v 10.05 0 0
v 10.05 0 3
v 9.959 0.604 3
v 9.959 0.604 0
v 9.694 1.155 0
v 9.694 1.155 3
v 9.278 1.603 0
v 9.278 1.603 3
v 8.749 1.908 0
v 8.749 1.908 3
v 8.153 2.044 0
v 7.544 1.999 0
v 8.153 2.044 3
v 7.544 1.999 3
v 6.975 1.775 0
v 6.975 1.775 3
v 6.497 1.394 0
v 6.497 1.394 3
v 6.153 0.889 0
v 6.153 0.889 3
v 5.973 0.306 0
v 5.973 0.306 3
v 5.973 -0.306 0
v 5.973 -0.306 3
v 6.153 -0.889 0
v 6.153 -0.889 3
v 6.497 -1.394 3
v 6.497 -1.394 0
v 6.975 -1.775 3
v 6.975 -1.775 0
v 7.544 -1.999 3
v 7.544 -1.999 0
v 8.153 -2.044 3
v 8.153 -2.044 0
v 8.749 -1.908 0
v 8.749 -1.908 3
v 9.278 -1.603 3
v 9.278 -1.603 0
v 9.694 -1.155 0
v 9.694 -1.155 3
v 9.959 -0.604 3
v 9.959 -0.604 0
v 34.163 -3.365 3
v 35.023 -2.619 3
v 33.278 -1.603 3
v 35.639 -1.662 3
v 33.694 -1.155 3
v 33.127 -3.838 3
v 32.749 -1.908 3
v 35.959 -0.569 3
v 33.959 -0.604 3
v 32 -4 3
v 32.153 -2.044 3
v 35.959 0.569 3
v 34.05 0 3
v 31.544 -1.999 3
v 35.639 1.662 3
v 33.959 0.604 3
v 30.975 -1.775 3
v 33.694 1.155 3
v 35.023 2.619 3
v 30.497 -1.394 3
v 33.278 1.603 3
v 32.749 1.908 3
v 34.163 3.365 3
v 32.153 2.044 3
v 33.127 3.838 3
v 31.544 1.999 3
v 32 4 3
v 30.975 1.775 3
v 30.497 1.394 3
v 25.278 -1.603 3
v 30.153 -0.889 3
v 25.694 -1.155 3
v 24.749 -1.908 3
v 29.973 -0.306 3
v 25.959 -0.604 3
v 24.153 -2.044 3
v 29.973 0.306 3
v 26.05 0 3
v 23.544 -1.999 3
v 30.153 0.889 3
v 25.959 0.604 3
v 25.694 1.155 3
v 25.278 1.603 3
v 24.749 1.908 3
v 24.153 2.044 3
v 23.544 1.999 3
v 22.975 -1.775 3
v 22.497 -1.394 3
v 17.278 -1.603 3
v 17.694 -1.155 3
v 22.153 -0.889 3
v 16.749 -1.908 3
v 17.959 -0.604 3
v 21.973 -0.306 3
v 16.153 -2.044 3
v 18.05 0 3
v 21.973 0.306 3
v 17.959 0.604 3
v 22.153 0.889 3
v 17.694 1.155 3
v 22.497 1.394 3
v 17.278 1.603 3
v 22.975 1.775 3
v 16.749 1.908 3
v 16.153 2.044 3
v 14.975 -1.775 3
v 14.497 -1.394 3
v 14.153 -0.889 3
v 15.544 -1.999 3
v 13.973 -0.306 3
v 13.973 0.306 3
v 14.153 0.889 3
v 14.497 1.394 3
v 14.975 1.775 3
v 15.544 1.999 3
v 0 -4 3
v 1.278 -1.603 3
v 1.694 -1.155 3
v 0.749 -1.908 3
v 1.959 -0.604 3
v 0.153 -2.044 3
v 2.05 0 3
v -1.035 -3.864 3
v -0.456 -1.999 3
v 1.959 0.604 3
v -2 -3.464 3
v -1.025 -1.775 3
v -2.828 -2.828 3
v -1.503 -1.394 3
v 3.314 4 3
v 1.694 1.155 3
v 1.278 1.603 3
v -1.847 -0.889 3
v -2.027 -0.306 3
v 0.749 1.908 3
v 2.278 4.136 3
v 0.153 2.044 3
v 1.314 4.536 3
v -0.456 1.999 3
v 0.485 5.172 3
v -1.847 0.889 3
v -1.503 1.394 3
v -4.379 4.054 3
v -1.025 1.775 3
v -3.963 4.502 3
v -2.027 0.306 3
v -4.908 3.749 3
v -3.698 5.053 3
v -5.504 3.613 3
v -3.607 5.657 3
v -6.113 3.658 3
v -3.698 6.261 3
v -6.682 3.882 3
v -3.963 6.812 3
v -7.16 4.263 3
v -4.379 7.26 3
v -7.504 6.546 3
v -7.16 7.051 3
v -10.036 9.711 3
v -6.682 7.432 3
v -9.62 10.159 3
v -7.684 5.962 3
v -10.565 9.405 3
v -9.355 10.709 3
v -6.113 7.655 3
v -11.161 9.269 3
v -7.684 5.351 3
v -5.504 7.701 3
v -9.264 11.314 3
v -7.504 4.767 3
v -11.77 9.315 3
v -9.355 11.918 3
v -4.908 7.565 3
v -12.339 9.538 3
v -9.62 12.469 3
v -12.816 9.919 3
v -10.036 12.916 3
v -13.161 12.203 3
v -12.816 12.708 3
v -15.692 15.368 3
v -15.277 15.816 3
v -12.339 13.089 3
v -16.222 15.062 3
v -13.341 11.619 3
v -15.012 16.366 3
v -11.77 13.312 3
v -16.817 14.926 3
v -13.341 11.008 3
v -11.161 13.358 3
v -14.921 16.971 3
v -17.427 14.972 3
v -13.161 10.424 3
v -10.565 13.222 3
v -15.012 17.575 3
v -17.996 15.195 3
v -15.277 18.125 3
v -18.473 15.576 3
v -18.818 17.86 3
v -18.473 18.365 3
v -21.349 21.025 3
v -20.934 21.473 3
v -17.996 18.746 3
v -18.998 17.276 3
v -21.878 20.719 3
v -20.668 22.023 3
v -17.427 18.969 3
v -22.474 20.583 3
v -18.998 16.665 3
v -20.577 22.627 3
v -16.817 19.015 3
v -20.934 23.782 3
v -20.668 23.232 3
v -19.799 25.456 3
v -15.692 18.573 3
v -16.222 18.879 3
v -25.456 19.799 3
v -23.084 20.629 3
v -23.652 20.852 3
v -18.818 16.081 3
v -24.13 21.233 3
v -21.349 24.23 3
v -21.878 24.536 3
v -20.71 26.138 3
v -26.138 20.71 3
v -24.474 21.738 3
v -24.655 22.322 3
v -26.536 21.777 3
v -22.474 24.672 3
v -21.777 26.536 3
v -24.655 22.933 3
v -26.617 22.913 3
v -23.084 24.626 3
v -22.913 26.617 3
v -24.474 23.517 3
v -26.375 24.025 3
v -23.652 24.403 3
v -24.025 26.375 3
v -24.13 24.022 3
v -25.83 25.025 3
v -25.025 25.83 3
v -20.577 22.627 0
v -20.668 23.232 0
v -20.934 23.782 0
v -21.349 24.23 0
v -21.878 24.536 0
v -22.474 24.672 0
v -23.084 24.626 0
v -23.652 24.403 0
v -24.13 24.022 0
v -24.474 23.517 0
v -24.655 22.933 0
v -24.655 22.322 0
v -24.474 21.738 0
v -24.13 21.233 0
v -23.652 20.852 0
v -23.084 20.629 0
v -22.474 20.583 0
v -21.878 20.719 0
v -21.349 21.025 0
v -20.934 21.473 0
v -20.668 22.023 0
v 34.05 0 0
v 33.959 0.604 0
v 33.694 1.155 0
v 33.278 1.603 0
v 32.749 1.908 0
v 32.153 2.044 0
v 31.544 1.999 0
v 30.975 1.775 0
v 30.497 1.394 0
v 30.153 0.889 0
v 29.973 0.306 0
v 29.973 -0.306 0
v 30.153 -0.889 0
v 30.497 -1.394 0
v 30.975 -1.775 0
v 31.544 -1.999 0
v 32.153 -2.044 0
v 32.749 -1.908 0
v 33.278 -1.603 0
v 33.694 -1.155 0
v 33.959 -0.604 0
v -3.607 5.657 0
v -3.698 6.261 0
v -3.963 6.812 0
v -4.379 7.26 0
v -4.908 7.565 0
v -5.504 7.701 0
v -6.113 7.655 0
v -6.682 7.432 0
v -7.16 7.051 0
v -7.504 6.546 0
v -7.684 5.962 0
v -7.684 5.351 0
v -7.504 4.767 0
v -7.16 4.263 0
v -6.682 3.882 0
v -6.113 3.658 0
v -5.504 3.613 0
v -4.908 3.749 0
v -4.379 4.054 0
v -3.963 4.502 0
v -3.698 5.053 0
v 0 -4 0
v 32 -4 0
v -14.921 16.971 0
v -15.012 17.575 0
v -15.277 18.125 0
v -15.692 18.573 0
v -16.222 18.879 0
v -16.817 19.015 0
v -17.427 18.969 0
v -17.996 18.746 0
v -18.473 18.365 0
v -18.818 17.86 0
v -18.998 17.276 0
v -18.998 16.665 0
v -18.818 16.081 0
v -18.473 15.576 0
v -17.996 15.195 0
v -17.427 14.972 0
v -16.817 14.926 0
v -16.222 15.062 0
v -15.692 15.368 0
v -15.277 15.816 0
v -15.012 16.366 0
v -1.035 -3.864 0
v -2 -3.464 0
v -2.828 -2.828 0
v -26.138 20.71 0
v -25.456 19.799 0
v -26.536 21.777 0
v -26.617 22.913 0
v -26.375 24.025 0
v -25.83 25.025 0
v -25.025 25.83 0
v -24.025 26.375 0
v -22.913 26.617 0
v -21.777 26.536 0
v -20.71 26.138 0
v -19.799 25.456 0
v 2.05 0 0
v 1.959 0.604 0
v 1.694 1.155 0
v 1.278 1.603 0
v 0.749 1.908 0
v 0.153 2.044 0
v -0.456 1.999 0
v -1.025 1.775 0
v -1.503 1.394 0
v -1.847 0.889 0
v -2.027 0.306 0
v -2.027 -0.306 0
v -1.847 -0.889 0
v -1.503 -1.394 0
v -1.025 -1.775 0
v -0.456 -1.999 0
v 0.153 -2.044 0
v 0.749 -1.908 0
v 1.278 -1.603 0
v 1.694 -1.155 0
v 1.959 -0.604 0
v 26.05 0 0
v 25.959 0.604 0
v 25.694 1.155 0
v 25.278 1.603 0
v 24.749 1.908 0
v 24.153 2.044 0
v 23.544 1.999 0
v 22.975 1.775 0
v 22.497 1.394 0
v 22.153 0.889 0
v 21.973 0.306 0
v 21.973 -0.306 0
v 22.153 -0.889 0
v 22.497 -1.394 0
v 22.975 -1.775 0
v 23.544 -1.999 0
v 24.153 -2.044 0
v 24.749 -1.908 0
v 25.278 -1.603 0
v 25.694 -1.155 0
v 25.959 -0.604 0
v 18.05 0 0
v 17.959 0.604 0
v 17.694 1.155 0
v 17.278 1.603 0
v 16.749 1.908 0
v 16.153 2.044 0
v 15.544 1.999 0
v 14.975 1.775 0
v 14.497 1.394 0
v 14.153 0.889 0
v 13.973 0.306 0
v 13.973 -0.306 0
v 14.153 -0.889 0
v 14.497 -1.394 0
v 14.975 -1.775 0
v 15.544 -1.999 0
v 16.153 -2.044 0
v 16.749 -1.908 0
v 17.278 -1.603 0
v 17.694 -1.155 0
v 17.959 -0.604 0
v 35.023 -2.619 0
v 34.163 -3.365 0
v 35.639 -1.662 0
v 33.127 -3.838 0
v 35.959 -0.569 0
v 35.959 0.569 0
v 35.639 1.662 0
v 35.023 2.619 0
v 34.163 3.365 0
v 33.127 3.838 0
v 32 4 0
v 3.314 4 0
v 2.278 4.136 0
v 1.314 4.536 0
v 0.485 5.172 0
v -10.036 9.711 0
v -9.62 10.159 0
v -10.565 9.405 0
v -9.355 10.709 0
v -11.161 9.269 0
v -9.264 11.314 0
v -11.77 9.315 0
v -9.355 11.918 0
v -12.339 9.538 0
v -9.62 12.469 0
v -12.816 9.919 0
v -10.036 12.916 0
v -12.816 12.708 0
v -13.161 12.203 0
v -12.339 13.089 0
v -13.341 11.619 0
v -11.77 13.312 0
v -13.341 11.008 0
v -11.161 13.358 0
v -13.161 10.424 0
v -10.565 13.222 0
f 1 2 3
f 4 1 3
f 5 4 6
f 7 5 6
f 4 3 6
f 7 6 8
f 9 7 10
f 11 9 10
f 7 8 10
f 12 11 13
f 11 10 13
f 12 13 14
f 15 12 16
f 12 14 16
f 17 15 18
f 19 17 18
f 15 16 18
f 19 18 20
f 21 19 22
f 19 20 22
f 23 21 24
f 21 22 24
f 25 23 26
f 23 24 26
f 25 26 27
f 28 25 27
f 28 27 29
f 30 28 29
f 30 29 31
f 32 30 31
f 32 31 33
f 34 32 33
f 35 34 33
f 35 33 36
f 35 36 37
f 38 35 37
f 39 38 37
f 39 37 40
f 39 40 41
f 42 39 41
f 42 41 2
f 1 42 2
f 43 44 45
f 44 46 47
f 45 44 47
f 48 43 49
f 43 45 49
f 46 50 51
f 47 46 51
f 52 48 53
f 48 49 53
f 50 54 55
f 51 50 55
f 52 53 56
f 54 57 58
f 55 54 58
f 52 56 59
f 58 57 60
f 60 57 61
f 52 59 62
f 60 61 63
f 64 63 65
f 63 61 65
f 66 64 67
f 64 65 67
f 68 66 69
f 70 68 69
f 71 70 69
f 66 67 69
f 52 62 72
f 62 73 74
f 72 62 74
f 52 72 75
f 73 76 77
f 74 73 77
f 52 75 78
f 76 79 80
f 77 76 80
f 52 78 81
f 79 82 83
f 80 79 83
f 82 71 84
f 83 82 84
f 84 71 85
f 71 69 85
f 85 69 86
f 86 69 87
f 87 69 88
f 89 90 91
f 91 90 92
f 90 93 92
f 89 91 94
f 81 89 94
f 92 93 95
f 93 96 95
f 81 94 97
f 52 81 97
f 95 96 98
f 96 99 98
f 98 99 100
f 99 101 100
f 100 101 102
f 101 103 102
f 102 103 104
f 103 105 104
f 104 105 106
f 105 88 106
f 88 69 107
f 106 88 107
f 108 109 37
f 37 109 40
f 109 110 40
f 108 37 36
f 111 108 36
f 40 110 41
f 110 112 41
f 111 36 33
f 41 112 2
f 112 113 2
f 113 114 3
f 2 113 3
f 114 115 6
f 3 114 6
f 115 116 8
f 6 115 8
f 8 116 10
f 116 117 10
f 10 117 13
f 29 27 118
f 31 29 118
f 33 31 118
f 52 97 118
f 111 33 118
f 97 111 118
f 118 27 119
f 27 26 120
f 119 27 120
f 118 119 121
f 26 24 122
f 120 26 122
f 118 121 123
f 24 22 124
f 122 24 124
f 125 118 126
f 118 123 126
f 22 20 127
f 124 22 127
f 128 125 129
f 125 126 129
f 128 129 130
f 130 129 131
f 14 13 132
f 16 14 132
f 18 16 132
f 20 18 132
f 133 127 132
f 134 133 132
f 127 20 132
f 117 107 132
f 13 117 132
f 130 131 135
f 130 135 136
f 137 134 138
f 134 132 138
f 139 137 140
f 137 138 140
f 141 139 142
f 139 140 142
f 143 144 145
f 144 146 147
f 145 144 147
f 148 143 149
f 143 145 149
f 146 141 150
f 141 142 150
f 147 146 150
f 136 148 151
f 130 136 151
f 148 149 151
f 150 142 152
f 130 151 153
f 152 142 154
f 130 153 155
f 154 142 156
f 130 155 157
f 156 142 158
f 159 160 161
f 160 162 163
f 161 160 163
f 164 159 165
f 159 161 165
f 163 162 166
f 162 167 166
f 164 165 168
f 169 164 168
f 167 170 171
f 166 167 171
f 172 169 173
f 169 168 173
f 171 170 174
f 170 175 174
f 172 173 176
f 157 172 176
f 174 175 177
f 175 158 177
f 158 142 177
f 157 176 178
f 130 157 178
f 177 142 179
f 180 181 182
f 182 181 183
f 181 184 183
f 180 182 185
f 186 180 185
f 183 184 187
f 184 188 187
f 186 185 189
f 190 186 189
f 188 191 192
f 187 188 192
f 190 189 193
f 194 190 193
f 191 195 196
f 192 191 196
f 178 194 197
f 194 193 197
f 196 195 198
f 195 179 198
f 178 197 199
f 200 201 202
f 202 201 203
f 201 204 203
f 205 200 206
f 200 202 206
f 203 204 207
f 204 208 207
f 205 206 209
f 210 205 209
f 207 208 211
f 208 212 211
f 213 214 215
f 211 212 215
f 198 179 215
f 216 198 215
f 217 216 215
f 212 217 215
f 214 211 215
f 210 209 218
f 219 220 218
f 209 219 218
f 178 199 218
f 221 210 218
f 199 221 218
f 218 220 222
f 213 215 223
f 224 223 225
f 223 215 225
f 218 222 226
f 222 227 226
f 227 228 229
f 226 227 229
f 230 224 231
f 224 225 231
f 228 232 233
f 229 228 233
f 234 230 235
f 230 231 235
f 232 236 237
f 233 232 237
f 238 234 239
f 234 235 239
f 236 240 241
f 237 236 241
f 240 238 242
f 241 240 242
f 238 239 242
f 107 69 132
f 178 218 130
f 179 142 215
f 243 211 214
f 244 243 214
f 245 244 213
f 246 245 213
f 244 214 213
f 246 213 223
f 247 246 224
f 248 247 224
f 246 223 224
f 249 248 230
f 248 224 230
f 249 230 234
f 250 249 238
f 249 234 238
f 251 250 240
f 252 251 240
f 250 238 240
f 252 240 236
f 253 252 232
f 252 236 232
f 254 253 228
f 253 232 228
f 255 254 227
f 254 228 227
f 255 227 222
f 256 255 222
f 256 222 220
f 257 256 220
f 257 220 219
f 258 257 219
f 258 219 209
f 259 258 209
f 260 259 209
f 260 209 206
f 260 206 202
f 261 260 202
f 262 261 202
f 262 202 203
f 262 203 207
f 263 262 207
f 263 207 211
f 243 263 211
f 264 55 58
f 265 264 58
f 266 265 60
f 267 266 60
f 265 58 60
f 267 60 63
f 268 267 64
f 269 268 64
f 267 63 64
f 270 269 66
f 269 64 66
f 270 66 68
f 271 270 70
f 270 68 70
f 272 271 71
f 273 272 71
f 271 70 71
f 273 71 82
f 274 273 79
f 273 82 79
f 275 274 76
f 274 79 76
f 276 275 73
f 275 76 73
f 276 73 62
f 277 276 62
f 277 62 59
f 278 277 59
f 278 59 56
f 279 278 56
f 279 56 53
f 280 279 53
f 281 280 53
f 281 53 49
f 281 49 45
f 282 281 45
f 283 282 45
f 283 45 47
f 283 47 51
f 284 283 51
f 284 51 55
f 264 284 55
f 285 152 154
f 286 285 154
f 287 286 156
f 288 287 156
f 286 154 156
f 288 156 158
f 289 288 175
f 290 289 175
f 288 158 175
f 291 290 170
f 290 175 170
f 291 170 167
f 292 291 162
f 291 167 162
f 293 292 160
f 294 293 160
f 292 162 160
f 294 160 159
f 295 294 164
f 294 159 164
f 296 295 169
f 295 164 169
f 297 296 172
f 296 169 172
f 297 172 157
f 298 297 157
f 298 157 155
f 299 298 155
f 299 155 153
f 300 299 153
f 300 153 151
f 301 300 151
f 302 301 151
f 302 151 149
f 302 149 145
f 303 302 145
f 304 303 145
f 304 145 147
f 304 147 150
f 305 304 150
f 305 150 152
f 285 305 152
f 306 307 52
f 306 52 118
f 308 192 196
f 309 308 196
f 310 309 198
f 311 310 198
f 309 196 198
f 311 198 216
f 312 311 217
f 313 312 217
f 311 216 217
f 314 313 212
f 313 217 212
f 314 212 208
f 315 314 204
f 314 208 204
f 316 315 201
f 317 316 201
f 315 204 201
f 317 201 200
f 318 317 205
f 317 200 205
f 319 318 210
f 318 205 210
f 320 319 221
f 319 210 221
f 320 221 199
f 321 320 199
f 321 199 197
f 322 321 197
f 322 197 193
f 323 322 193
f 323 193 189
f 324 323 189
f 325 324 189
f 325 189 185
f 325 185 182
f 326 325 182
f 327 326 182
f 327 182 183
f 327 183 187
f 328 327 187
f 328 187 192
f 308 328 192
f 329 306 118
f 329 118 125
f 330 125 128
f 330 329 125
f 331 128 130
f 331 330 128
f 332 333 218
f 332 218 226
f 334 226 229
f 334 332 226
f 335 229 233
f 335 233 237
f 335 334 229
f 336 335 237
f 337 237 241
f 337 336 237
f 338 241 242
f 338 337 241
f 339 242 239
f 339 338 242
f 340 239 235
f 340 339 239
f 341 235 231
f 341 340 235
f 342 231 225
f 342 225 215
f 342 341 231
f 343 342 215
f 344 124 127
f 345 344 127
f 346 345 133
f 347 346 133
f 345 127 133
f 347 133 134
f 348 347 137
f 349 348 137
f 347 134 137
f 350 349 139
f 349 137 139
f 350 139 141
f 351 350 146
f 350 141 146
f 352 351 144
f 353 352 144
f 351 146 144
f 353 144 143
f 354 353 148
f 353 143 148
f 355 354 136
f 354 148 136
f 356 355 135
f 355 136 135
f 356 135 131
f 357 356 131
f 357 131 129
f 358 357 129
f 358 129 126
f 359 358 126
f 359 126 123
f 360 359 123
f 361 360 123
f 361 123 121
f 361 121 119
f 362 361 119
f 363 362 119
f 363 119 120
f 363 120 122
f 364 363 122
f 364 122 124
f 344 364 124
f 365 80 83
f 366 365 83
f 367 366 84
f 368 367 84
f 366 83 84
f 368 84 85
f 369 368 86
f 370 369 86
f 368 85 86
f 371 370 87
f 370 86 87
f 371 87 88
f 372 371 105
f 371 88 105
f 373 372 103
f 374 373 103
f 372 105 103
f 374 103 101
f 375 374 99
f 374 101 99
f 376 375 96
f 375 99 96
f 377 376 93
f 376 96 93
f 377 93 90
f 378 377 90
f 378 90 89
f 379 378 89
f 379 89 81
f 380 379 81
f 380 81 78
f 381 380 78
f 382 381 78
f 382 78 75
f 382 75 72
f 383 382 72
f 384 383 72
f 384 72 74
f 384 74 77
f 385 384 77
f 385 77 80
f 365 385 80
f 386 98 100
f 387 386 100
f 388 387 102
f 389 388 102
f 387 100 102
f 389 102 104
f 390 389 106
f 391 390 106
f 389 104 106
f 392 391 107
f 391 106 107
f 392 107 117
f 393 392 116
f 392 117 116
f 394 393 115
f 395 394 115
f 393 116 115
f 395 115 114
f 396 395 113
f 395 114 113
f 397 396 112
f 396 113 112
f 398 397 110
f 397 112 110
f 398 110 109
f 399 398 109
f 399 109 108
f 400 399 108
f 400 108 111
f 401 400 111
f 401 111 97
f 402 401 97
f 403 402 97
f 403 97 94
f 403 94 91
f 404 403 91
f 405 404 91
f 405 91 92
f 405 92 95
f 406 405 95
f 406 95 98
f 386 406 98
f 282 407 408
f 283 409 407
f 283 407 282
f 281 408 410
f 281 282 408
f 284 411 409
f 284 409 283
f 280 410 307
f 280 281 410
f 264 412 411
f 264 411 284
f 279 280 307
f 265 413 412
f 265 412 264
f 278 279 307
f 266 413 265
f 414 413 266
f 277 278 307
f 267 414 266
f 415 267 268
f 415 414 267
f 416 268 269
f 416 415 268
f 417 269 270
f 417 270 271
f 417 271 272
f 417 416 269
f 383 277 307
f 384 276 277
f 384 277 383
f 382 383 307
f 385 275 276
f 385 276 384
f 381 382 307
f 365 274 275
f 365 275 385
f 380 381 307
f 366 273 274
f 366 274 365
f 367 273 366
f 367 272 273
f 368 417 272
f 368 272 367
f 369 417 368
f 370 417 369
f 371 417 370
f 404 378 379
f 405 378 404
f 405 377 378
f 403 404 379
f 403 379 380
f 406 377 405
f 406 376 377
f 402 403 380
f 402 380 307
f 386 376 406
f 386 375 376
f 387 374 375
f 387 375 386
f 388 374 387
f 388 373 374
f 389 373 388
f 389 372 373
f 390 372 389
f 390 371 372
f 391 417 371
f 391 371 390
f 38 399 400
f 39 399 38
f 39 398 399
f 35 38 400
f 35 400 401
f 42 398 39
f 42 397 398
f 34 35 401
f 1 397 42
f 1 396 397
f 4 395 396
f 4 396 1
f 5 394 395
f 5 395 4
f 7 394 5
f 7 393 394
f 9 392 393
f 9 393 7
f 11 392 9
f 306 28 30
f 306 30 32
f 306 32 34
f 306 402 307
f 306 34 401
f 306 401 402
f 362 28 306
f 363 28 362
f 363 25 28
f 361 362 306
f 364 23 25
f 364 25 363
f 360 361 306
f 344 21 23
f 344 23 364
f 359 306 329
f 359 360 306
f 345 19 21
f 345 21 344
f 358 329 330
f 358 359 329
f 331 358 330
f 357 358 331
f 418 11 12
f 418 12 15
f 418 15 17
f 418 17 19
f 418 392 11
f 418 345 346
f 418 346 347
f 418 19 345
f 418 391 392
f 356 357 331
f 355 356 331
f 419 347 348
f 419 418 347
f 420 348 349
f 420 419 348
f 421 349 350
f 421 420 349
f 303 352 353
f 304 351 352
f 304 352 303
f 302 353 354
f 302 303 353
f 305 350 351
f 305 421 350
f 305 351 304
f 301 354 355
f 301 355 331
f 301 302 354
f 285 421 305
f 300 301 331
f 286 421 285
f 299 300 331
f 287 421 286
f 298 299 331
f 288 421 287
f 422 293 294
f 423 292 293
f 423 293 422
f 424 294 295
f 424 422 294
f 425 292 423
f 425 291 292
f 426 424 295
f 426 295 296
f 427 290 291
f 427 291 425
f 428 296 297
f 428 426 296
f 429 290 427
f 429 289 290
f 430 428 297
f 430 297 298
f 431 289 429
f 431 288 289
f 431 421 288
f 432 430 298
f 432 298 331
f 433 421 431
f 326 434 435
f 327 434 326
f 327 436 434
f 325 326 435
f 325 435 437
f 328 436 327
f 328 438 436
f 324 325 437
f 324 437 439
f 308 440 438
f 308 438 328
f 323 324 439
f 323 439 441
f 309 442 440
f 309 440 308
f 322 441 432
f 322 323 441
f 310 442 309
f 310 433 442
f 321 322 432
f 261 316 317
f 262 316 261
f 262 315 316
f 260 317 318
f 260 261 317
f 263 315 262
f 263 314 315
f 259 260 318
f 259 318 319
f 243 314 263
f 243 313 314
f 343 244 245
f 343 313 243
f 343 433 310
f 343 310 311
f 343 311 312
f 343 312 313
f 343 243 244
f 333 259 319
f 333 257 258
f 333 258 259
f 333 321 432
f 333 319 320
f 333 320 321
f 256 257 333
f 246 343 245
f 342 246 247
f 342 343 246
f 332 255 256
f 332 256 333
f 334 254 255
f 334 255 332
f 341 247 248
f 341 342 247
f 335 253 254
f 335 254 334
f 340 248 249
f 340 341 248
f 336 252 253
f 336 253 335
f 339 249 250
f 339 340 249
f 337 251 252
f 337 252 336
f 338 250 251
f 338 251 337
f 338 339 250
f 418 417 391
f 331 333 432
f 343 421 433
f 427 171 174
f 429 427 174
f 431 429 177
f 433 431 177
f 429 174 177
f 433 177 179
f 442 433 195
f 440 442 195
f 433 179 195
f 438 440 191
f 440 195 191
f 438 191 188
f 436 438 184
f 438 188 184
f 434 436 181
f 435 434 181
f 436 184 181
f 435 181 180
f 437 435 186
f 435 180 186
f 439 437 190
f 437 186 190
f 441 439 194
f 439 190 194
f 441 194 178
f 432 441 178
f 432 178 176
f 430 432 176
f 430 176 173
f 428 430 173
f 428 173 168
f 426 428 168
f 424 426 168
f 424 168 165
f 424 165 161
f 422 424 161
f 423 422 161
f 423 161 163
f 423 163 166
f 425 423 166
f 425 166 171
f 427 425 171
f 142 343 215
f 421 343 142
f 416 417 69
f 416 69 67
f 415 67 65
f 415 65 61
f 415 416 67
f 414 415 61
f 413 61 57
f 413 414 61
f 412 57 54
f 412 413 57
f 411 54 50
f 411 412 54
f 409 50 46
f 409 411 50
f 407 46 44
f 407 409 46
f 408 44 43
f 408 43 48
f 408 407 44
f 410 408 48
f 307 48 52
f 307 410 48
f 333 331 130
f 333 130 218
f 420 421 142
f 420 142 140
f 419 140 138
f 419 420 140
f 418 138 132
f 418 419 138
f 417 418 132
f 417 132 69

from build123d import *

# Parameters (mm, degrees)
BOSS_EXTRUDE1_DEPTH = 3
SKETCH2_R           = 2.05
CUT_EXTRUDE1_DEPTH  = 45.877826774
LPATTERN1_COUNT     = 5
LPATTERN1_PITCH     = 8
SKETCH3_R           = 2.05
CUT_EXTRUDE2_DEPTH  = 45.877826774
LPATTERN2_COUNT     = 5
LPATTERN2_PITCH     = 8


with BuildPart() as part:
    # Sketch1 → Boss-Extrude1 (new body)
    with BuildSketch(Plane.XY):
        with BuildLine():
            Line((3.313708499, 4), (32, 4))
            ThreePointArc((32, 4), (36, 0), (32, -4))
            Line((32, -4), (0, -4))
            ThreePointArc((0, -4), (-1.530733729, -3.69551813), (-2.828427125, -2.828427125))
            Line((-2.828427125, -2.828427125), (-25.455844123, 19.798989873))
            ThreePointArc((-25.455844123, 19.798989873), (-25.455844123, 25.455844123), (-19.798989873, 25.455844123))
            Line((-19.798989873, 25.455844123), (0.485281374, 5.171572875))
            ThreePointArc((0.485281374, 5.171572875), (1.78297477, 4.30448187), (3.313708499, 4))
        make_face()
    extrude(amount=BOSS_EXTRUDE1_DEPTH)

    # Sketch2 → Cut-Extrude1 (cut, through all)
    with BuildSketch(Plane.XY.offset(3)):
        with Locations((-22.627416998, 22.627416998)):
            Circle(SKETCH2_R)
    cut_extrude1 = extrude(amount=-CUT_EXTRUDE1_DEPTH, mode=Mode.SUBTRACT)

    # LPattern1: Cut-Extrude1 ×5
    with Locations(*[Vector(0.7071067811865515, -0.7071067811865437, 0) * (i * LPATTERN1_PITCH) for i in range(1, LPATTERN1_COUNT)]):
        add(cut_extrude1, mode=Mode.SUBTRACT)

    # Sketch3 → Cut-Extrude2 (cut, through all)
    with BuildSketch(Plane.XY.offset(3)):
        with Locations((32, 0)):
            Circle(SKETCH3_R)
    cut_extrude2 = extrude(amount=-CUT_EXTRUDE2_DEPTH, mode=Mode.SUBTRACT)

    # LPattern2: Cut-Extrude2 ×5
    with Locations(*[(-i * LPATTERN2_PITCH, 0, 0) for i in range(1, LPATTERN2_COUNT)]):
        add(cut_extrude2, mode=Mode.SUBTRACT)


solid = part.part
